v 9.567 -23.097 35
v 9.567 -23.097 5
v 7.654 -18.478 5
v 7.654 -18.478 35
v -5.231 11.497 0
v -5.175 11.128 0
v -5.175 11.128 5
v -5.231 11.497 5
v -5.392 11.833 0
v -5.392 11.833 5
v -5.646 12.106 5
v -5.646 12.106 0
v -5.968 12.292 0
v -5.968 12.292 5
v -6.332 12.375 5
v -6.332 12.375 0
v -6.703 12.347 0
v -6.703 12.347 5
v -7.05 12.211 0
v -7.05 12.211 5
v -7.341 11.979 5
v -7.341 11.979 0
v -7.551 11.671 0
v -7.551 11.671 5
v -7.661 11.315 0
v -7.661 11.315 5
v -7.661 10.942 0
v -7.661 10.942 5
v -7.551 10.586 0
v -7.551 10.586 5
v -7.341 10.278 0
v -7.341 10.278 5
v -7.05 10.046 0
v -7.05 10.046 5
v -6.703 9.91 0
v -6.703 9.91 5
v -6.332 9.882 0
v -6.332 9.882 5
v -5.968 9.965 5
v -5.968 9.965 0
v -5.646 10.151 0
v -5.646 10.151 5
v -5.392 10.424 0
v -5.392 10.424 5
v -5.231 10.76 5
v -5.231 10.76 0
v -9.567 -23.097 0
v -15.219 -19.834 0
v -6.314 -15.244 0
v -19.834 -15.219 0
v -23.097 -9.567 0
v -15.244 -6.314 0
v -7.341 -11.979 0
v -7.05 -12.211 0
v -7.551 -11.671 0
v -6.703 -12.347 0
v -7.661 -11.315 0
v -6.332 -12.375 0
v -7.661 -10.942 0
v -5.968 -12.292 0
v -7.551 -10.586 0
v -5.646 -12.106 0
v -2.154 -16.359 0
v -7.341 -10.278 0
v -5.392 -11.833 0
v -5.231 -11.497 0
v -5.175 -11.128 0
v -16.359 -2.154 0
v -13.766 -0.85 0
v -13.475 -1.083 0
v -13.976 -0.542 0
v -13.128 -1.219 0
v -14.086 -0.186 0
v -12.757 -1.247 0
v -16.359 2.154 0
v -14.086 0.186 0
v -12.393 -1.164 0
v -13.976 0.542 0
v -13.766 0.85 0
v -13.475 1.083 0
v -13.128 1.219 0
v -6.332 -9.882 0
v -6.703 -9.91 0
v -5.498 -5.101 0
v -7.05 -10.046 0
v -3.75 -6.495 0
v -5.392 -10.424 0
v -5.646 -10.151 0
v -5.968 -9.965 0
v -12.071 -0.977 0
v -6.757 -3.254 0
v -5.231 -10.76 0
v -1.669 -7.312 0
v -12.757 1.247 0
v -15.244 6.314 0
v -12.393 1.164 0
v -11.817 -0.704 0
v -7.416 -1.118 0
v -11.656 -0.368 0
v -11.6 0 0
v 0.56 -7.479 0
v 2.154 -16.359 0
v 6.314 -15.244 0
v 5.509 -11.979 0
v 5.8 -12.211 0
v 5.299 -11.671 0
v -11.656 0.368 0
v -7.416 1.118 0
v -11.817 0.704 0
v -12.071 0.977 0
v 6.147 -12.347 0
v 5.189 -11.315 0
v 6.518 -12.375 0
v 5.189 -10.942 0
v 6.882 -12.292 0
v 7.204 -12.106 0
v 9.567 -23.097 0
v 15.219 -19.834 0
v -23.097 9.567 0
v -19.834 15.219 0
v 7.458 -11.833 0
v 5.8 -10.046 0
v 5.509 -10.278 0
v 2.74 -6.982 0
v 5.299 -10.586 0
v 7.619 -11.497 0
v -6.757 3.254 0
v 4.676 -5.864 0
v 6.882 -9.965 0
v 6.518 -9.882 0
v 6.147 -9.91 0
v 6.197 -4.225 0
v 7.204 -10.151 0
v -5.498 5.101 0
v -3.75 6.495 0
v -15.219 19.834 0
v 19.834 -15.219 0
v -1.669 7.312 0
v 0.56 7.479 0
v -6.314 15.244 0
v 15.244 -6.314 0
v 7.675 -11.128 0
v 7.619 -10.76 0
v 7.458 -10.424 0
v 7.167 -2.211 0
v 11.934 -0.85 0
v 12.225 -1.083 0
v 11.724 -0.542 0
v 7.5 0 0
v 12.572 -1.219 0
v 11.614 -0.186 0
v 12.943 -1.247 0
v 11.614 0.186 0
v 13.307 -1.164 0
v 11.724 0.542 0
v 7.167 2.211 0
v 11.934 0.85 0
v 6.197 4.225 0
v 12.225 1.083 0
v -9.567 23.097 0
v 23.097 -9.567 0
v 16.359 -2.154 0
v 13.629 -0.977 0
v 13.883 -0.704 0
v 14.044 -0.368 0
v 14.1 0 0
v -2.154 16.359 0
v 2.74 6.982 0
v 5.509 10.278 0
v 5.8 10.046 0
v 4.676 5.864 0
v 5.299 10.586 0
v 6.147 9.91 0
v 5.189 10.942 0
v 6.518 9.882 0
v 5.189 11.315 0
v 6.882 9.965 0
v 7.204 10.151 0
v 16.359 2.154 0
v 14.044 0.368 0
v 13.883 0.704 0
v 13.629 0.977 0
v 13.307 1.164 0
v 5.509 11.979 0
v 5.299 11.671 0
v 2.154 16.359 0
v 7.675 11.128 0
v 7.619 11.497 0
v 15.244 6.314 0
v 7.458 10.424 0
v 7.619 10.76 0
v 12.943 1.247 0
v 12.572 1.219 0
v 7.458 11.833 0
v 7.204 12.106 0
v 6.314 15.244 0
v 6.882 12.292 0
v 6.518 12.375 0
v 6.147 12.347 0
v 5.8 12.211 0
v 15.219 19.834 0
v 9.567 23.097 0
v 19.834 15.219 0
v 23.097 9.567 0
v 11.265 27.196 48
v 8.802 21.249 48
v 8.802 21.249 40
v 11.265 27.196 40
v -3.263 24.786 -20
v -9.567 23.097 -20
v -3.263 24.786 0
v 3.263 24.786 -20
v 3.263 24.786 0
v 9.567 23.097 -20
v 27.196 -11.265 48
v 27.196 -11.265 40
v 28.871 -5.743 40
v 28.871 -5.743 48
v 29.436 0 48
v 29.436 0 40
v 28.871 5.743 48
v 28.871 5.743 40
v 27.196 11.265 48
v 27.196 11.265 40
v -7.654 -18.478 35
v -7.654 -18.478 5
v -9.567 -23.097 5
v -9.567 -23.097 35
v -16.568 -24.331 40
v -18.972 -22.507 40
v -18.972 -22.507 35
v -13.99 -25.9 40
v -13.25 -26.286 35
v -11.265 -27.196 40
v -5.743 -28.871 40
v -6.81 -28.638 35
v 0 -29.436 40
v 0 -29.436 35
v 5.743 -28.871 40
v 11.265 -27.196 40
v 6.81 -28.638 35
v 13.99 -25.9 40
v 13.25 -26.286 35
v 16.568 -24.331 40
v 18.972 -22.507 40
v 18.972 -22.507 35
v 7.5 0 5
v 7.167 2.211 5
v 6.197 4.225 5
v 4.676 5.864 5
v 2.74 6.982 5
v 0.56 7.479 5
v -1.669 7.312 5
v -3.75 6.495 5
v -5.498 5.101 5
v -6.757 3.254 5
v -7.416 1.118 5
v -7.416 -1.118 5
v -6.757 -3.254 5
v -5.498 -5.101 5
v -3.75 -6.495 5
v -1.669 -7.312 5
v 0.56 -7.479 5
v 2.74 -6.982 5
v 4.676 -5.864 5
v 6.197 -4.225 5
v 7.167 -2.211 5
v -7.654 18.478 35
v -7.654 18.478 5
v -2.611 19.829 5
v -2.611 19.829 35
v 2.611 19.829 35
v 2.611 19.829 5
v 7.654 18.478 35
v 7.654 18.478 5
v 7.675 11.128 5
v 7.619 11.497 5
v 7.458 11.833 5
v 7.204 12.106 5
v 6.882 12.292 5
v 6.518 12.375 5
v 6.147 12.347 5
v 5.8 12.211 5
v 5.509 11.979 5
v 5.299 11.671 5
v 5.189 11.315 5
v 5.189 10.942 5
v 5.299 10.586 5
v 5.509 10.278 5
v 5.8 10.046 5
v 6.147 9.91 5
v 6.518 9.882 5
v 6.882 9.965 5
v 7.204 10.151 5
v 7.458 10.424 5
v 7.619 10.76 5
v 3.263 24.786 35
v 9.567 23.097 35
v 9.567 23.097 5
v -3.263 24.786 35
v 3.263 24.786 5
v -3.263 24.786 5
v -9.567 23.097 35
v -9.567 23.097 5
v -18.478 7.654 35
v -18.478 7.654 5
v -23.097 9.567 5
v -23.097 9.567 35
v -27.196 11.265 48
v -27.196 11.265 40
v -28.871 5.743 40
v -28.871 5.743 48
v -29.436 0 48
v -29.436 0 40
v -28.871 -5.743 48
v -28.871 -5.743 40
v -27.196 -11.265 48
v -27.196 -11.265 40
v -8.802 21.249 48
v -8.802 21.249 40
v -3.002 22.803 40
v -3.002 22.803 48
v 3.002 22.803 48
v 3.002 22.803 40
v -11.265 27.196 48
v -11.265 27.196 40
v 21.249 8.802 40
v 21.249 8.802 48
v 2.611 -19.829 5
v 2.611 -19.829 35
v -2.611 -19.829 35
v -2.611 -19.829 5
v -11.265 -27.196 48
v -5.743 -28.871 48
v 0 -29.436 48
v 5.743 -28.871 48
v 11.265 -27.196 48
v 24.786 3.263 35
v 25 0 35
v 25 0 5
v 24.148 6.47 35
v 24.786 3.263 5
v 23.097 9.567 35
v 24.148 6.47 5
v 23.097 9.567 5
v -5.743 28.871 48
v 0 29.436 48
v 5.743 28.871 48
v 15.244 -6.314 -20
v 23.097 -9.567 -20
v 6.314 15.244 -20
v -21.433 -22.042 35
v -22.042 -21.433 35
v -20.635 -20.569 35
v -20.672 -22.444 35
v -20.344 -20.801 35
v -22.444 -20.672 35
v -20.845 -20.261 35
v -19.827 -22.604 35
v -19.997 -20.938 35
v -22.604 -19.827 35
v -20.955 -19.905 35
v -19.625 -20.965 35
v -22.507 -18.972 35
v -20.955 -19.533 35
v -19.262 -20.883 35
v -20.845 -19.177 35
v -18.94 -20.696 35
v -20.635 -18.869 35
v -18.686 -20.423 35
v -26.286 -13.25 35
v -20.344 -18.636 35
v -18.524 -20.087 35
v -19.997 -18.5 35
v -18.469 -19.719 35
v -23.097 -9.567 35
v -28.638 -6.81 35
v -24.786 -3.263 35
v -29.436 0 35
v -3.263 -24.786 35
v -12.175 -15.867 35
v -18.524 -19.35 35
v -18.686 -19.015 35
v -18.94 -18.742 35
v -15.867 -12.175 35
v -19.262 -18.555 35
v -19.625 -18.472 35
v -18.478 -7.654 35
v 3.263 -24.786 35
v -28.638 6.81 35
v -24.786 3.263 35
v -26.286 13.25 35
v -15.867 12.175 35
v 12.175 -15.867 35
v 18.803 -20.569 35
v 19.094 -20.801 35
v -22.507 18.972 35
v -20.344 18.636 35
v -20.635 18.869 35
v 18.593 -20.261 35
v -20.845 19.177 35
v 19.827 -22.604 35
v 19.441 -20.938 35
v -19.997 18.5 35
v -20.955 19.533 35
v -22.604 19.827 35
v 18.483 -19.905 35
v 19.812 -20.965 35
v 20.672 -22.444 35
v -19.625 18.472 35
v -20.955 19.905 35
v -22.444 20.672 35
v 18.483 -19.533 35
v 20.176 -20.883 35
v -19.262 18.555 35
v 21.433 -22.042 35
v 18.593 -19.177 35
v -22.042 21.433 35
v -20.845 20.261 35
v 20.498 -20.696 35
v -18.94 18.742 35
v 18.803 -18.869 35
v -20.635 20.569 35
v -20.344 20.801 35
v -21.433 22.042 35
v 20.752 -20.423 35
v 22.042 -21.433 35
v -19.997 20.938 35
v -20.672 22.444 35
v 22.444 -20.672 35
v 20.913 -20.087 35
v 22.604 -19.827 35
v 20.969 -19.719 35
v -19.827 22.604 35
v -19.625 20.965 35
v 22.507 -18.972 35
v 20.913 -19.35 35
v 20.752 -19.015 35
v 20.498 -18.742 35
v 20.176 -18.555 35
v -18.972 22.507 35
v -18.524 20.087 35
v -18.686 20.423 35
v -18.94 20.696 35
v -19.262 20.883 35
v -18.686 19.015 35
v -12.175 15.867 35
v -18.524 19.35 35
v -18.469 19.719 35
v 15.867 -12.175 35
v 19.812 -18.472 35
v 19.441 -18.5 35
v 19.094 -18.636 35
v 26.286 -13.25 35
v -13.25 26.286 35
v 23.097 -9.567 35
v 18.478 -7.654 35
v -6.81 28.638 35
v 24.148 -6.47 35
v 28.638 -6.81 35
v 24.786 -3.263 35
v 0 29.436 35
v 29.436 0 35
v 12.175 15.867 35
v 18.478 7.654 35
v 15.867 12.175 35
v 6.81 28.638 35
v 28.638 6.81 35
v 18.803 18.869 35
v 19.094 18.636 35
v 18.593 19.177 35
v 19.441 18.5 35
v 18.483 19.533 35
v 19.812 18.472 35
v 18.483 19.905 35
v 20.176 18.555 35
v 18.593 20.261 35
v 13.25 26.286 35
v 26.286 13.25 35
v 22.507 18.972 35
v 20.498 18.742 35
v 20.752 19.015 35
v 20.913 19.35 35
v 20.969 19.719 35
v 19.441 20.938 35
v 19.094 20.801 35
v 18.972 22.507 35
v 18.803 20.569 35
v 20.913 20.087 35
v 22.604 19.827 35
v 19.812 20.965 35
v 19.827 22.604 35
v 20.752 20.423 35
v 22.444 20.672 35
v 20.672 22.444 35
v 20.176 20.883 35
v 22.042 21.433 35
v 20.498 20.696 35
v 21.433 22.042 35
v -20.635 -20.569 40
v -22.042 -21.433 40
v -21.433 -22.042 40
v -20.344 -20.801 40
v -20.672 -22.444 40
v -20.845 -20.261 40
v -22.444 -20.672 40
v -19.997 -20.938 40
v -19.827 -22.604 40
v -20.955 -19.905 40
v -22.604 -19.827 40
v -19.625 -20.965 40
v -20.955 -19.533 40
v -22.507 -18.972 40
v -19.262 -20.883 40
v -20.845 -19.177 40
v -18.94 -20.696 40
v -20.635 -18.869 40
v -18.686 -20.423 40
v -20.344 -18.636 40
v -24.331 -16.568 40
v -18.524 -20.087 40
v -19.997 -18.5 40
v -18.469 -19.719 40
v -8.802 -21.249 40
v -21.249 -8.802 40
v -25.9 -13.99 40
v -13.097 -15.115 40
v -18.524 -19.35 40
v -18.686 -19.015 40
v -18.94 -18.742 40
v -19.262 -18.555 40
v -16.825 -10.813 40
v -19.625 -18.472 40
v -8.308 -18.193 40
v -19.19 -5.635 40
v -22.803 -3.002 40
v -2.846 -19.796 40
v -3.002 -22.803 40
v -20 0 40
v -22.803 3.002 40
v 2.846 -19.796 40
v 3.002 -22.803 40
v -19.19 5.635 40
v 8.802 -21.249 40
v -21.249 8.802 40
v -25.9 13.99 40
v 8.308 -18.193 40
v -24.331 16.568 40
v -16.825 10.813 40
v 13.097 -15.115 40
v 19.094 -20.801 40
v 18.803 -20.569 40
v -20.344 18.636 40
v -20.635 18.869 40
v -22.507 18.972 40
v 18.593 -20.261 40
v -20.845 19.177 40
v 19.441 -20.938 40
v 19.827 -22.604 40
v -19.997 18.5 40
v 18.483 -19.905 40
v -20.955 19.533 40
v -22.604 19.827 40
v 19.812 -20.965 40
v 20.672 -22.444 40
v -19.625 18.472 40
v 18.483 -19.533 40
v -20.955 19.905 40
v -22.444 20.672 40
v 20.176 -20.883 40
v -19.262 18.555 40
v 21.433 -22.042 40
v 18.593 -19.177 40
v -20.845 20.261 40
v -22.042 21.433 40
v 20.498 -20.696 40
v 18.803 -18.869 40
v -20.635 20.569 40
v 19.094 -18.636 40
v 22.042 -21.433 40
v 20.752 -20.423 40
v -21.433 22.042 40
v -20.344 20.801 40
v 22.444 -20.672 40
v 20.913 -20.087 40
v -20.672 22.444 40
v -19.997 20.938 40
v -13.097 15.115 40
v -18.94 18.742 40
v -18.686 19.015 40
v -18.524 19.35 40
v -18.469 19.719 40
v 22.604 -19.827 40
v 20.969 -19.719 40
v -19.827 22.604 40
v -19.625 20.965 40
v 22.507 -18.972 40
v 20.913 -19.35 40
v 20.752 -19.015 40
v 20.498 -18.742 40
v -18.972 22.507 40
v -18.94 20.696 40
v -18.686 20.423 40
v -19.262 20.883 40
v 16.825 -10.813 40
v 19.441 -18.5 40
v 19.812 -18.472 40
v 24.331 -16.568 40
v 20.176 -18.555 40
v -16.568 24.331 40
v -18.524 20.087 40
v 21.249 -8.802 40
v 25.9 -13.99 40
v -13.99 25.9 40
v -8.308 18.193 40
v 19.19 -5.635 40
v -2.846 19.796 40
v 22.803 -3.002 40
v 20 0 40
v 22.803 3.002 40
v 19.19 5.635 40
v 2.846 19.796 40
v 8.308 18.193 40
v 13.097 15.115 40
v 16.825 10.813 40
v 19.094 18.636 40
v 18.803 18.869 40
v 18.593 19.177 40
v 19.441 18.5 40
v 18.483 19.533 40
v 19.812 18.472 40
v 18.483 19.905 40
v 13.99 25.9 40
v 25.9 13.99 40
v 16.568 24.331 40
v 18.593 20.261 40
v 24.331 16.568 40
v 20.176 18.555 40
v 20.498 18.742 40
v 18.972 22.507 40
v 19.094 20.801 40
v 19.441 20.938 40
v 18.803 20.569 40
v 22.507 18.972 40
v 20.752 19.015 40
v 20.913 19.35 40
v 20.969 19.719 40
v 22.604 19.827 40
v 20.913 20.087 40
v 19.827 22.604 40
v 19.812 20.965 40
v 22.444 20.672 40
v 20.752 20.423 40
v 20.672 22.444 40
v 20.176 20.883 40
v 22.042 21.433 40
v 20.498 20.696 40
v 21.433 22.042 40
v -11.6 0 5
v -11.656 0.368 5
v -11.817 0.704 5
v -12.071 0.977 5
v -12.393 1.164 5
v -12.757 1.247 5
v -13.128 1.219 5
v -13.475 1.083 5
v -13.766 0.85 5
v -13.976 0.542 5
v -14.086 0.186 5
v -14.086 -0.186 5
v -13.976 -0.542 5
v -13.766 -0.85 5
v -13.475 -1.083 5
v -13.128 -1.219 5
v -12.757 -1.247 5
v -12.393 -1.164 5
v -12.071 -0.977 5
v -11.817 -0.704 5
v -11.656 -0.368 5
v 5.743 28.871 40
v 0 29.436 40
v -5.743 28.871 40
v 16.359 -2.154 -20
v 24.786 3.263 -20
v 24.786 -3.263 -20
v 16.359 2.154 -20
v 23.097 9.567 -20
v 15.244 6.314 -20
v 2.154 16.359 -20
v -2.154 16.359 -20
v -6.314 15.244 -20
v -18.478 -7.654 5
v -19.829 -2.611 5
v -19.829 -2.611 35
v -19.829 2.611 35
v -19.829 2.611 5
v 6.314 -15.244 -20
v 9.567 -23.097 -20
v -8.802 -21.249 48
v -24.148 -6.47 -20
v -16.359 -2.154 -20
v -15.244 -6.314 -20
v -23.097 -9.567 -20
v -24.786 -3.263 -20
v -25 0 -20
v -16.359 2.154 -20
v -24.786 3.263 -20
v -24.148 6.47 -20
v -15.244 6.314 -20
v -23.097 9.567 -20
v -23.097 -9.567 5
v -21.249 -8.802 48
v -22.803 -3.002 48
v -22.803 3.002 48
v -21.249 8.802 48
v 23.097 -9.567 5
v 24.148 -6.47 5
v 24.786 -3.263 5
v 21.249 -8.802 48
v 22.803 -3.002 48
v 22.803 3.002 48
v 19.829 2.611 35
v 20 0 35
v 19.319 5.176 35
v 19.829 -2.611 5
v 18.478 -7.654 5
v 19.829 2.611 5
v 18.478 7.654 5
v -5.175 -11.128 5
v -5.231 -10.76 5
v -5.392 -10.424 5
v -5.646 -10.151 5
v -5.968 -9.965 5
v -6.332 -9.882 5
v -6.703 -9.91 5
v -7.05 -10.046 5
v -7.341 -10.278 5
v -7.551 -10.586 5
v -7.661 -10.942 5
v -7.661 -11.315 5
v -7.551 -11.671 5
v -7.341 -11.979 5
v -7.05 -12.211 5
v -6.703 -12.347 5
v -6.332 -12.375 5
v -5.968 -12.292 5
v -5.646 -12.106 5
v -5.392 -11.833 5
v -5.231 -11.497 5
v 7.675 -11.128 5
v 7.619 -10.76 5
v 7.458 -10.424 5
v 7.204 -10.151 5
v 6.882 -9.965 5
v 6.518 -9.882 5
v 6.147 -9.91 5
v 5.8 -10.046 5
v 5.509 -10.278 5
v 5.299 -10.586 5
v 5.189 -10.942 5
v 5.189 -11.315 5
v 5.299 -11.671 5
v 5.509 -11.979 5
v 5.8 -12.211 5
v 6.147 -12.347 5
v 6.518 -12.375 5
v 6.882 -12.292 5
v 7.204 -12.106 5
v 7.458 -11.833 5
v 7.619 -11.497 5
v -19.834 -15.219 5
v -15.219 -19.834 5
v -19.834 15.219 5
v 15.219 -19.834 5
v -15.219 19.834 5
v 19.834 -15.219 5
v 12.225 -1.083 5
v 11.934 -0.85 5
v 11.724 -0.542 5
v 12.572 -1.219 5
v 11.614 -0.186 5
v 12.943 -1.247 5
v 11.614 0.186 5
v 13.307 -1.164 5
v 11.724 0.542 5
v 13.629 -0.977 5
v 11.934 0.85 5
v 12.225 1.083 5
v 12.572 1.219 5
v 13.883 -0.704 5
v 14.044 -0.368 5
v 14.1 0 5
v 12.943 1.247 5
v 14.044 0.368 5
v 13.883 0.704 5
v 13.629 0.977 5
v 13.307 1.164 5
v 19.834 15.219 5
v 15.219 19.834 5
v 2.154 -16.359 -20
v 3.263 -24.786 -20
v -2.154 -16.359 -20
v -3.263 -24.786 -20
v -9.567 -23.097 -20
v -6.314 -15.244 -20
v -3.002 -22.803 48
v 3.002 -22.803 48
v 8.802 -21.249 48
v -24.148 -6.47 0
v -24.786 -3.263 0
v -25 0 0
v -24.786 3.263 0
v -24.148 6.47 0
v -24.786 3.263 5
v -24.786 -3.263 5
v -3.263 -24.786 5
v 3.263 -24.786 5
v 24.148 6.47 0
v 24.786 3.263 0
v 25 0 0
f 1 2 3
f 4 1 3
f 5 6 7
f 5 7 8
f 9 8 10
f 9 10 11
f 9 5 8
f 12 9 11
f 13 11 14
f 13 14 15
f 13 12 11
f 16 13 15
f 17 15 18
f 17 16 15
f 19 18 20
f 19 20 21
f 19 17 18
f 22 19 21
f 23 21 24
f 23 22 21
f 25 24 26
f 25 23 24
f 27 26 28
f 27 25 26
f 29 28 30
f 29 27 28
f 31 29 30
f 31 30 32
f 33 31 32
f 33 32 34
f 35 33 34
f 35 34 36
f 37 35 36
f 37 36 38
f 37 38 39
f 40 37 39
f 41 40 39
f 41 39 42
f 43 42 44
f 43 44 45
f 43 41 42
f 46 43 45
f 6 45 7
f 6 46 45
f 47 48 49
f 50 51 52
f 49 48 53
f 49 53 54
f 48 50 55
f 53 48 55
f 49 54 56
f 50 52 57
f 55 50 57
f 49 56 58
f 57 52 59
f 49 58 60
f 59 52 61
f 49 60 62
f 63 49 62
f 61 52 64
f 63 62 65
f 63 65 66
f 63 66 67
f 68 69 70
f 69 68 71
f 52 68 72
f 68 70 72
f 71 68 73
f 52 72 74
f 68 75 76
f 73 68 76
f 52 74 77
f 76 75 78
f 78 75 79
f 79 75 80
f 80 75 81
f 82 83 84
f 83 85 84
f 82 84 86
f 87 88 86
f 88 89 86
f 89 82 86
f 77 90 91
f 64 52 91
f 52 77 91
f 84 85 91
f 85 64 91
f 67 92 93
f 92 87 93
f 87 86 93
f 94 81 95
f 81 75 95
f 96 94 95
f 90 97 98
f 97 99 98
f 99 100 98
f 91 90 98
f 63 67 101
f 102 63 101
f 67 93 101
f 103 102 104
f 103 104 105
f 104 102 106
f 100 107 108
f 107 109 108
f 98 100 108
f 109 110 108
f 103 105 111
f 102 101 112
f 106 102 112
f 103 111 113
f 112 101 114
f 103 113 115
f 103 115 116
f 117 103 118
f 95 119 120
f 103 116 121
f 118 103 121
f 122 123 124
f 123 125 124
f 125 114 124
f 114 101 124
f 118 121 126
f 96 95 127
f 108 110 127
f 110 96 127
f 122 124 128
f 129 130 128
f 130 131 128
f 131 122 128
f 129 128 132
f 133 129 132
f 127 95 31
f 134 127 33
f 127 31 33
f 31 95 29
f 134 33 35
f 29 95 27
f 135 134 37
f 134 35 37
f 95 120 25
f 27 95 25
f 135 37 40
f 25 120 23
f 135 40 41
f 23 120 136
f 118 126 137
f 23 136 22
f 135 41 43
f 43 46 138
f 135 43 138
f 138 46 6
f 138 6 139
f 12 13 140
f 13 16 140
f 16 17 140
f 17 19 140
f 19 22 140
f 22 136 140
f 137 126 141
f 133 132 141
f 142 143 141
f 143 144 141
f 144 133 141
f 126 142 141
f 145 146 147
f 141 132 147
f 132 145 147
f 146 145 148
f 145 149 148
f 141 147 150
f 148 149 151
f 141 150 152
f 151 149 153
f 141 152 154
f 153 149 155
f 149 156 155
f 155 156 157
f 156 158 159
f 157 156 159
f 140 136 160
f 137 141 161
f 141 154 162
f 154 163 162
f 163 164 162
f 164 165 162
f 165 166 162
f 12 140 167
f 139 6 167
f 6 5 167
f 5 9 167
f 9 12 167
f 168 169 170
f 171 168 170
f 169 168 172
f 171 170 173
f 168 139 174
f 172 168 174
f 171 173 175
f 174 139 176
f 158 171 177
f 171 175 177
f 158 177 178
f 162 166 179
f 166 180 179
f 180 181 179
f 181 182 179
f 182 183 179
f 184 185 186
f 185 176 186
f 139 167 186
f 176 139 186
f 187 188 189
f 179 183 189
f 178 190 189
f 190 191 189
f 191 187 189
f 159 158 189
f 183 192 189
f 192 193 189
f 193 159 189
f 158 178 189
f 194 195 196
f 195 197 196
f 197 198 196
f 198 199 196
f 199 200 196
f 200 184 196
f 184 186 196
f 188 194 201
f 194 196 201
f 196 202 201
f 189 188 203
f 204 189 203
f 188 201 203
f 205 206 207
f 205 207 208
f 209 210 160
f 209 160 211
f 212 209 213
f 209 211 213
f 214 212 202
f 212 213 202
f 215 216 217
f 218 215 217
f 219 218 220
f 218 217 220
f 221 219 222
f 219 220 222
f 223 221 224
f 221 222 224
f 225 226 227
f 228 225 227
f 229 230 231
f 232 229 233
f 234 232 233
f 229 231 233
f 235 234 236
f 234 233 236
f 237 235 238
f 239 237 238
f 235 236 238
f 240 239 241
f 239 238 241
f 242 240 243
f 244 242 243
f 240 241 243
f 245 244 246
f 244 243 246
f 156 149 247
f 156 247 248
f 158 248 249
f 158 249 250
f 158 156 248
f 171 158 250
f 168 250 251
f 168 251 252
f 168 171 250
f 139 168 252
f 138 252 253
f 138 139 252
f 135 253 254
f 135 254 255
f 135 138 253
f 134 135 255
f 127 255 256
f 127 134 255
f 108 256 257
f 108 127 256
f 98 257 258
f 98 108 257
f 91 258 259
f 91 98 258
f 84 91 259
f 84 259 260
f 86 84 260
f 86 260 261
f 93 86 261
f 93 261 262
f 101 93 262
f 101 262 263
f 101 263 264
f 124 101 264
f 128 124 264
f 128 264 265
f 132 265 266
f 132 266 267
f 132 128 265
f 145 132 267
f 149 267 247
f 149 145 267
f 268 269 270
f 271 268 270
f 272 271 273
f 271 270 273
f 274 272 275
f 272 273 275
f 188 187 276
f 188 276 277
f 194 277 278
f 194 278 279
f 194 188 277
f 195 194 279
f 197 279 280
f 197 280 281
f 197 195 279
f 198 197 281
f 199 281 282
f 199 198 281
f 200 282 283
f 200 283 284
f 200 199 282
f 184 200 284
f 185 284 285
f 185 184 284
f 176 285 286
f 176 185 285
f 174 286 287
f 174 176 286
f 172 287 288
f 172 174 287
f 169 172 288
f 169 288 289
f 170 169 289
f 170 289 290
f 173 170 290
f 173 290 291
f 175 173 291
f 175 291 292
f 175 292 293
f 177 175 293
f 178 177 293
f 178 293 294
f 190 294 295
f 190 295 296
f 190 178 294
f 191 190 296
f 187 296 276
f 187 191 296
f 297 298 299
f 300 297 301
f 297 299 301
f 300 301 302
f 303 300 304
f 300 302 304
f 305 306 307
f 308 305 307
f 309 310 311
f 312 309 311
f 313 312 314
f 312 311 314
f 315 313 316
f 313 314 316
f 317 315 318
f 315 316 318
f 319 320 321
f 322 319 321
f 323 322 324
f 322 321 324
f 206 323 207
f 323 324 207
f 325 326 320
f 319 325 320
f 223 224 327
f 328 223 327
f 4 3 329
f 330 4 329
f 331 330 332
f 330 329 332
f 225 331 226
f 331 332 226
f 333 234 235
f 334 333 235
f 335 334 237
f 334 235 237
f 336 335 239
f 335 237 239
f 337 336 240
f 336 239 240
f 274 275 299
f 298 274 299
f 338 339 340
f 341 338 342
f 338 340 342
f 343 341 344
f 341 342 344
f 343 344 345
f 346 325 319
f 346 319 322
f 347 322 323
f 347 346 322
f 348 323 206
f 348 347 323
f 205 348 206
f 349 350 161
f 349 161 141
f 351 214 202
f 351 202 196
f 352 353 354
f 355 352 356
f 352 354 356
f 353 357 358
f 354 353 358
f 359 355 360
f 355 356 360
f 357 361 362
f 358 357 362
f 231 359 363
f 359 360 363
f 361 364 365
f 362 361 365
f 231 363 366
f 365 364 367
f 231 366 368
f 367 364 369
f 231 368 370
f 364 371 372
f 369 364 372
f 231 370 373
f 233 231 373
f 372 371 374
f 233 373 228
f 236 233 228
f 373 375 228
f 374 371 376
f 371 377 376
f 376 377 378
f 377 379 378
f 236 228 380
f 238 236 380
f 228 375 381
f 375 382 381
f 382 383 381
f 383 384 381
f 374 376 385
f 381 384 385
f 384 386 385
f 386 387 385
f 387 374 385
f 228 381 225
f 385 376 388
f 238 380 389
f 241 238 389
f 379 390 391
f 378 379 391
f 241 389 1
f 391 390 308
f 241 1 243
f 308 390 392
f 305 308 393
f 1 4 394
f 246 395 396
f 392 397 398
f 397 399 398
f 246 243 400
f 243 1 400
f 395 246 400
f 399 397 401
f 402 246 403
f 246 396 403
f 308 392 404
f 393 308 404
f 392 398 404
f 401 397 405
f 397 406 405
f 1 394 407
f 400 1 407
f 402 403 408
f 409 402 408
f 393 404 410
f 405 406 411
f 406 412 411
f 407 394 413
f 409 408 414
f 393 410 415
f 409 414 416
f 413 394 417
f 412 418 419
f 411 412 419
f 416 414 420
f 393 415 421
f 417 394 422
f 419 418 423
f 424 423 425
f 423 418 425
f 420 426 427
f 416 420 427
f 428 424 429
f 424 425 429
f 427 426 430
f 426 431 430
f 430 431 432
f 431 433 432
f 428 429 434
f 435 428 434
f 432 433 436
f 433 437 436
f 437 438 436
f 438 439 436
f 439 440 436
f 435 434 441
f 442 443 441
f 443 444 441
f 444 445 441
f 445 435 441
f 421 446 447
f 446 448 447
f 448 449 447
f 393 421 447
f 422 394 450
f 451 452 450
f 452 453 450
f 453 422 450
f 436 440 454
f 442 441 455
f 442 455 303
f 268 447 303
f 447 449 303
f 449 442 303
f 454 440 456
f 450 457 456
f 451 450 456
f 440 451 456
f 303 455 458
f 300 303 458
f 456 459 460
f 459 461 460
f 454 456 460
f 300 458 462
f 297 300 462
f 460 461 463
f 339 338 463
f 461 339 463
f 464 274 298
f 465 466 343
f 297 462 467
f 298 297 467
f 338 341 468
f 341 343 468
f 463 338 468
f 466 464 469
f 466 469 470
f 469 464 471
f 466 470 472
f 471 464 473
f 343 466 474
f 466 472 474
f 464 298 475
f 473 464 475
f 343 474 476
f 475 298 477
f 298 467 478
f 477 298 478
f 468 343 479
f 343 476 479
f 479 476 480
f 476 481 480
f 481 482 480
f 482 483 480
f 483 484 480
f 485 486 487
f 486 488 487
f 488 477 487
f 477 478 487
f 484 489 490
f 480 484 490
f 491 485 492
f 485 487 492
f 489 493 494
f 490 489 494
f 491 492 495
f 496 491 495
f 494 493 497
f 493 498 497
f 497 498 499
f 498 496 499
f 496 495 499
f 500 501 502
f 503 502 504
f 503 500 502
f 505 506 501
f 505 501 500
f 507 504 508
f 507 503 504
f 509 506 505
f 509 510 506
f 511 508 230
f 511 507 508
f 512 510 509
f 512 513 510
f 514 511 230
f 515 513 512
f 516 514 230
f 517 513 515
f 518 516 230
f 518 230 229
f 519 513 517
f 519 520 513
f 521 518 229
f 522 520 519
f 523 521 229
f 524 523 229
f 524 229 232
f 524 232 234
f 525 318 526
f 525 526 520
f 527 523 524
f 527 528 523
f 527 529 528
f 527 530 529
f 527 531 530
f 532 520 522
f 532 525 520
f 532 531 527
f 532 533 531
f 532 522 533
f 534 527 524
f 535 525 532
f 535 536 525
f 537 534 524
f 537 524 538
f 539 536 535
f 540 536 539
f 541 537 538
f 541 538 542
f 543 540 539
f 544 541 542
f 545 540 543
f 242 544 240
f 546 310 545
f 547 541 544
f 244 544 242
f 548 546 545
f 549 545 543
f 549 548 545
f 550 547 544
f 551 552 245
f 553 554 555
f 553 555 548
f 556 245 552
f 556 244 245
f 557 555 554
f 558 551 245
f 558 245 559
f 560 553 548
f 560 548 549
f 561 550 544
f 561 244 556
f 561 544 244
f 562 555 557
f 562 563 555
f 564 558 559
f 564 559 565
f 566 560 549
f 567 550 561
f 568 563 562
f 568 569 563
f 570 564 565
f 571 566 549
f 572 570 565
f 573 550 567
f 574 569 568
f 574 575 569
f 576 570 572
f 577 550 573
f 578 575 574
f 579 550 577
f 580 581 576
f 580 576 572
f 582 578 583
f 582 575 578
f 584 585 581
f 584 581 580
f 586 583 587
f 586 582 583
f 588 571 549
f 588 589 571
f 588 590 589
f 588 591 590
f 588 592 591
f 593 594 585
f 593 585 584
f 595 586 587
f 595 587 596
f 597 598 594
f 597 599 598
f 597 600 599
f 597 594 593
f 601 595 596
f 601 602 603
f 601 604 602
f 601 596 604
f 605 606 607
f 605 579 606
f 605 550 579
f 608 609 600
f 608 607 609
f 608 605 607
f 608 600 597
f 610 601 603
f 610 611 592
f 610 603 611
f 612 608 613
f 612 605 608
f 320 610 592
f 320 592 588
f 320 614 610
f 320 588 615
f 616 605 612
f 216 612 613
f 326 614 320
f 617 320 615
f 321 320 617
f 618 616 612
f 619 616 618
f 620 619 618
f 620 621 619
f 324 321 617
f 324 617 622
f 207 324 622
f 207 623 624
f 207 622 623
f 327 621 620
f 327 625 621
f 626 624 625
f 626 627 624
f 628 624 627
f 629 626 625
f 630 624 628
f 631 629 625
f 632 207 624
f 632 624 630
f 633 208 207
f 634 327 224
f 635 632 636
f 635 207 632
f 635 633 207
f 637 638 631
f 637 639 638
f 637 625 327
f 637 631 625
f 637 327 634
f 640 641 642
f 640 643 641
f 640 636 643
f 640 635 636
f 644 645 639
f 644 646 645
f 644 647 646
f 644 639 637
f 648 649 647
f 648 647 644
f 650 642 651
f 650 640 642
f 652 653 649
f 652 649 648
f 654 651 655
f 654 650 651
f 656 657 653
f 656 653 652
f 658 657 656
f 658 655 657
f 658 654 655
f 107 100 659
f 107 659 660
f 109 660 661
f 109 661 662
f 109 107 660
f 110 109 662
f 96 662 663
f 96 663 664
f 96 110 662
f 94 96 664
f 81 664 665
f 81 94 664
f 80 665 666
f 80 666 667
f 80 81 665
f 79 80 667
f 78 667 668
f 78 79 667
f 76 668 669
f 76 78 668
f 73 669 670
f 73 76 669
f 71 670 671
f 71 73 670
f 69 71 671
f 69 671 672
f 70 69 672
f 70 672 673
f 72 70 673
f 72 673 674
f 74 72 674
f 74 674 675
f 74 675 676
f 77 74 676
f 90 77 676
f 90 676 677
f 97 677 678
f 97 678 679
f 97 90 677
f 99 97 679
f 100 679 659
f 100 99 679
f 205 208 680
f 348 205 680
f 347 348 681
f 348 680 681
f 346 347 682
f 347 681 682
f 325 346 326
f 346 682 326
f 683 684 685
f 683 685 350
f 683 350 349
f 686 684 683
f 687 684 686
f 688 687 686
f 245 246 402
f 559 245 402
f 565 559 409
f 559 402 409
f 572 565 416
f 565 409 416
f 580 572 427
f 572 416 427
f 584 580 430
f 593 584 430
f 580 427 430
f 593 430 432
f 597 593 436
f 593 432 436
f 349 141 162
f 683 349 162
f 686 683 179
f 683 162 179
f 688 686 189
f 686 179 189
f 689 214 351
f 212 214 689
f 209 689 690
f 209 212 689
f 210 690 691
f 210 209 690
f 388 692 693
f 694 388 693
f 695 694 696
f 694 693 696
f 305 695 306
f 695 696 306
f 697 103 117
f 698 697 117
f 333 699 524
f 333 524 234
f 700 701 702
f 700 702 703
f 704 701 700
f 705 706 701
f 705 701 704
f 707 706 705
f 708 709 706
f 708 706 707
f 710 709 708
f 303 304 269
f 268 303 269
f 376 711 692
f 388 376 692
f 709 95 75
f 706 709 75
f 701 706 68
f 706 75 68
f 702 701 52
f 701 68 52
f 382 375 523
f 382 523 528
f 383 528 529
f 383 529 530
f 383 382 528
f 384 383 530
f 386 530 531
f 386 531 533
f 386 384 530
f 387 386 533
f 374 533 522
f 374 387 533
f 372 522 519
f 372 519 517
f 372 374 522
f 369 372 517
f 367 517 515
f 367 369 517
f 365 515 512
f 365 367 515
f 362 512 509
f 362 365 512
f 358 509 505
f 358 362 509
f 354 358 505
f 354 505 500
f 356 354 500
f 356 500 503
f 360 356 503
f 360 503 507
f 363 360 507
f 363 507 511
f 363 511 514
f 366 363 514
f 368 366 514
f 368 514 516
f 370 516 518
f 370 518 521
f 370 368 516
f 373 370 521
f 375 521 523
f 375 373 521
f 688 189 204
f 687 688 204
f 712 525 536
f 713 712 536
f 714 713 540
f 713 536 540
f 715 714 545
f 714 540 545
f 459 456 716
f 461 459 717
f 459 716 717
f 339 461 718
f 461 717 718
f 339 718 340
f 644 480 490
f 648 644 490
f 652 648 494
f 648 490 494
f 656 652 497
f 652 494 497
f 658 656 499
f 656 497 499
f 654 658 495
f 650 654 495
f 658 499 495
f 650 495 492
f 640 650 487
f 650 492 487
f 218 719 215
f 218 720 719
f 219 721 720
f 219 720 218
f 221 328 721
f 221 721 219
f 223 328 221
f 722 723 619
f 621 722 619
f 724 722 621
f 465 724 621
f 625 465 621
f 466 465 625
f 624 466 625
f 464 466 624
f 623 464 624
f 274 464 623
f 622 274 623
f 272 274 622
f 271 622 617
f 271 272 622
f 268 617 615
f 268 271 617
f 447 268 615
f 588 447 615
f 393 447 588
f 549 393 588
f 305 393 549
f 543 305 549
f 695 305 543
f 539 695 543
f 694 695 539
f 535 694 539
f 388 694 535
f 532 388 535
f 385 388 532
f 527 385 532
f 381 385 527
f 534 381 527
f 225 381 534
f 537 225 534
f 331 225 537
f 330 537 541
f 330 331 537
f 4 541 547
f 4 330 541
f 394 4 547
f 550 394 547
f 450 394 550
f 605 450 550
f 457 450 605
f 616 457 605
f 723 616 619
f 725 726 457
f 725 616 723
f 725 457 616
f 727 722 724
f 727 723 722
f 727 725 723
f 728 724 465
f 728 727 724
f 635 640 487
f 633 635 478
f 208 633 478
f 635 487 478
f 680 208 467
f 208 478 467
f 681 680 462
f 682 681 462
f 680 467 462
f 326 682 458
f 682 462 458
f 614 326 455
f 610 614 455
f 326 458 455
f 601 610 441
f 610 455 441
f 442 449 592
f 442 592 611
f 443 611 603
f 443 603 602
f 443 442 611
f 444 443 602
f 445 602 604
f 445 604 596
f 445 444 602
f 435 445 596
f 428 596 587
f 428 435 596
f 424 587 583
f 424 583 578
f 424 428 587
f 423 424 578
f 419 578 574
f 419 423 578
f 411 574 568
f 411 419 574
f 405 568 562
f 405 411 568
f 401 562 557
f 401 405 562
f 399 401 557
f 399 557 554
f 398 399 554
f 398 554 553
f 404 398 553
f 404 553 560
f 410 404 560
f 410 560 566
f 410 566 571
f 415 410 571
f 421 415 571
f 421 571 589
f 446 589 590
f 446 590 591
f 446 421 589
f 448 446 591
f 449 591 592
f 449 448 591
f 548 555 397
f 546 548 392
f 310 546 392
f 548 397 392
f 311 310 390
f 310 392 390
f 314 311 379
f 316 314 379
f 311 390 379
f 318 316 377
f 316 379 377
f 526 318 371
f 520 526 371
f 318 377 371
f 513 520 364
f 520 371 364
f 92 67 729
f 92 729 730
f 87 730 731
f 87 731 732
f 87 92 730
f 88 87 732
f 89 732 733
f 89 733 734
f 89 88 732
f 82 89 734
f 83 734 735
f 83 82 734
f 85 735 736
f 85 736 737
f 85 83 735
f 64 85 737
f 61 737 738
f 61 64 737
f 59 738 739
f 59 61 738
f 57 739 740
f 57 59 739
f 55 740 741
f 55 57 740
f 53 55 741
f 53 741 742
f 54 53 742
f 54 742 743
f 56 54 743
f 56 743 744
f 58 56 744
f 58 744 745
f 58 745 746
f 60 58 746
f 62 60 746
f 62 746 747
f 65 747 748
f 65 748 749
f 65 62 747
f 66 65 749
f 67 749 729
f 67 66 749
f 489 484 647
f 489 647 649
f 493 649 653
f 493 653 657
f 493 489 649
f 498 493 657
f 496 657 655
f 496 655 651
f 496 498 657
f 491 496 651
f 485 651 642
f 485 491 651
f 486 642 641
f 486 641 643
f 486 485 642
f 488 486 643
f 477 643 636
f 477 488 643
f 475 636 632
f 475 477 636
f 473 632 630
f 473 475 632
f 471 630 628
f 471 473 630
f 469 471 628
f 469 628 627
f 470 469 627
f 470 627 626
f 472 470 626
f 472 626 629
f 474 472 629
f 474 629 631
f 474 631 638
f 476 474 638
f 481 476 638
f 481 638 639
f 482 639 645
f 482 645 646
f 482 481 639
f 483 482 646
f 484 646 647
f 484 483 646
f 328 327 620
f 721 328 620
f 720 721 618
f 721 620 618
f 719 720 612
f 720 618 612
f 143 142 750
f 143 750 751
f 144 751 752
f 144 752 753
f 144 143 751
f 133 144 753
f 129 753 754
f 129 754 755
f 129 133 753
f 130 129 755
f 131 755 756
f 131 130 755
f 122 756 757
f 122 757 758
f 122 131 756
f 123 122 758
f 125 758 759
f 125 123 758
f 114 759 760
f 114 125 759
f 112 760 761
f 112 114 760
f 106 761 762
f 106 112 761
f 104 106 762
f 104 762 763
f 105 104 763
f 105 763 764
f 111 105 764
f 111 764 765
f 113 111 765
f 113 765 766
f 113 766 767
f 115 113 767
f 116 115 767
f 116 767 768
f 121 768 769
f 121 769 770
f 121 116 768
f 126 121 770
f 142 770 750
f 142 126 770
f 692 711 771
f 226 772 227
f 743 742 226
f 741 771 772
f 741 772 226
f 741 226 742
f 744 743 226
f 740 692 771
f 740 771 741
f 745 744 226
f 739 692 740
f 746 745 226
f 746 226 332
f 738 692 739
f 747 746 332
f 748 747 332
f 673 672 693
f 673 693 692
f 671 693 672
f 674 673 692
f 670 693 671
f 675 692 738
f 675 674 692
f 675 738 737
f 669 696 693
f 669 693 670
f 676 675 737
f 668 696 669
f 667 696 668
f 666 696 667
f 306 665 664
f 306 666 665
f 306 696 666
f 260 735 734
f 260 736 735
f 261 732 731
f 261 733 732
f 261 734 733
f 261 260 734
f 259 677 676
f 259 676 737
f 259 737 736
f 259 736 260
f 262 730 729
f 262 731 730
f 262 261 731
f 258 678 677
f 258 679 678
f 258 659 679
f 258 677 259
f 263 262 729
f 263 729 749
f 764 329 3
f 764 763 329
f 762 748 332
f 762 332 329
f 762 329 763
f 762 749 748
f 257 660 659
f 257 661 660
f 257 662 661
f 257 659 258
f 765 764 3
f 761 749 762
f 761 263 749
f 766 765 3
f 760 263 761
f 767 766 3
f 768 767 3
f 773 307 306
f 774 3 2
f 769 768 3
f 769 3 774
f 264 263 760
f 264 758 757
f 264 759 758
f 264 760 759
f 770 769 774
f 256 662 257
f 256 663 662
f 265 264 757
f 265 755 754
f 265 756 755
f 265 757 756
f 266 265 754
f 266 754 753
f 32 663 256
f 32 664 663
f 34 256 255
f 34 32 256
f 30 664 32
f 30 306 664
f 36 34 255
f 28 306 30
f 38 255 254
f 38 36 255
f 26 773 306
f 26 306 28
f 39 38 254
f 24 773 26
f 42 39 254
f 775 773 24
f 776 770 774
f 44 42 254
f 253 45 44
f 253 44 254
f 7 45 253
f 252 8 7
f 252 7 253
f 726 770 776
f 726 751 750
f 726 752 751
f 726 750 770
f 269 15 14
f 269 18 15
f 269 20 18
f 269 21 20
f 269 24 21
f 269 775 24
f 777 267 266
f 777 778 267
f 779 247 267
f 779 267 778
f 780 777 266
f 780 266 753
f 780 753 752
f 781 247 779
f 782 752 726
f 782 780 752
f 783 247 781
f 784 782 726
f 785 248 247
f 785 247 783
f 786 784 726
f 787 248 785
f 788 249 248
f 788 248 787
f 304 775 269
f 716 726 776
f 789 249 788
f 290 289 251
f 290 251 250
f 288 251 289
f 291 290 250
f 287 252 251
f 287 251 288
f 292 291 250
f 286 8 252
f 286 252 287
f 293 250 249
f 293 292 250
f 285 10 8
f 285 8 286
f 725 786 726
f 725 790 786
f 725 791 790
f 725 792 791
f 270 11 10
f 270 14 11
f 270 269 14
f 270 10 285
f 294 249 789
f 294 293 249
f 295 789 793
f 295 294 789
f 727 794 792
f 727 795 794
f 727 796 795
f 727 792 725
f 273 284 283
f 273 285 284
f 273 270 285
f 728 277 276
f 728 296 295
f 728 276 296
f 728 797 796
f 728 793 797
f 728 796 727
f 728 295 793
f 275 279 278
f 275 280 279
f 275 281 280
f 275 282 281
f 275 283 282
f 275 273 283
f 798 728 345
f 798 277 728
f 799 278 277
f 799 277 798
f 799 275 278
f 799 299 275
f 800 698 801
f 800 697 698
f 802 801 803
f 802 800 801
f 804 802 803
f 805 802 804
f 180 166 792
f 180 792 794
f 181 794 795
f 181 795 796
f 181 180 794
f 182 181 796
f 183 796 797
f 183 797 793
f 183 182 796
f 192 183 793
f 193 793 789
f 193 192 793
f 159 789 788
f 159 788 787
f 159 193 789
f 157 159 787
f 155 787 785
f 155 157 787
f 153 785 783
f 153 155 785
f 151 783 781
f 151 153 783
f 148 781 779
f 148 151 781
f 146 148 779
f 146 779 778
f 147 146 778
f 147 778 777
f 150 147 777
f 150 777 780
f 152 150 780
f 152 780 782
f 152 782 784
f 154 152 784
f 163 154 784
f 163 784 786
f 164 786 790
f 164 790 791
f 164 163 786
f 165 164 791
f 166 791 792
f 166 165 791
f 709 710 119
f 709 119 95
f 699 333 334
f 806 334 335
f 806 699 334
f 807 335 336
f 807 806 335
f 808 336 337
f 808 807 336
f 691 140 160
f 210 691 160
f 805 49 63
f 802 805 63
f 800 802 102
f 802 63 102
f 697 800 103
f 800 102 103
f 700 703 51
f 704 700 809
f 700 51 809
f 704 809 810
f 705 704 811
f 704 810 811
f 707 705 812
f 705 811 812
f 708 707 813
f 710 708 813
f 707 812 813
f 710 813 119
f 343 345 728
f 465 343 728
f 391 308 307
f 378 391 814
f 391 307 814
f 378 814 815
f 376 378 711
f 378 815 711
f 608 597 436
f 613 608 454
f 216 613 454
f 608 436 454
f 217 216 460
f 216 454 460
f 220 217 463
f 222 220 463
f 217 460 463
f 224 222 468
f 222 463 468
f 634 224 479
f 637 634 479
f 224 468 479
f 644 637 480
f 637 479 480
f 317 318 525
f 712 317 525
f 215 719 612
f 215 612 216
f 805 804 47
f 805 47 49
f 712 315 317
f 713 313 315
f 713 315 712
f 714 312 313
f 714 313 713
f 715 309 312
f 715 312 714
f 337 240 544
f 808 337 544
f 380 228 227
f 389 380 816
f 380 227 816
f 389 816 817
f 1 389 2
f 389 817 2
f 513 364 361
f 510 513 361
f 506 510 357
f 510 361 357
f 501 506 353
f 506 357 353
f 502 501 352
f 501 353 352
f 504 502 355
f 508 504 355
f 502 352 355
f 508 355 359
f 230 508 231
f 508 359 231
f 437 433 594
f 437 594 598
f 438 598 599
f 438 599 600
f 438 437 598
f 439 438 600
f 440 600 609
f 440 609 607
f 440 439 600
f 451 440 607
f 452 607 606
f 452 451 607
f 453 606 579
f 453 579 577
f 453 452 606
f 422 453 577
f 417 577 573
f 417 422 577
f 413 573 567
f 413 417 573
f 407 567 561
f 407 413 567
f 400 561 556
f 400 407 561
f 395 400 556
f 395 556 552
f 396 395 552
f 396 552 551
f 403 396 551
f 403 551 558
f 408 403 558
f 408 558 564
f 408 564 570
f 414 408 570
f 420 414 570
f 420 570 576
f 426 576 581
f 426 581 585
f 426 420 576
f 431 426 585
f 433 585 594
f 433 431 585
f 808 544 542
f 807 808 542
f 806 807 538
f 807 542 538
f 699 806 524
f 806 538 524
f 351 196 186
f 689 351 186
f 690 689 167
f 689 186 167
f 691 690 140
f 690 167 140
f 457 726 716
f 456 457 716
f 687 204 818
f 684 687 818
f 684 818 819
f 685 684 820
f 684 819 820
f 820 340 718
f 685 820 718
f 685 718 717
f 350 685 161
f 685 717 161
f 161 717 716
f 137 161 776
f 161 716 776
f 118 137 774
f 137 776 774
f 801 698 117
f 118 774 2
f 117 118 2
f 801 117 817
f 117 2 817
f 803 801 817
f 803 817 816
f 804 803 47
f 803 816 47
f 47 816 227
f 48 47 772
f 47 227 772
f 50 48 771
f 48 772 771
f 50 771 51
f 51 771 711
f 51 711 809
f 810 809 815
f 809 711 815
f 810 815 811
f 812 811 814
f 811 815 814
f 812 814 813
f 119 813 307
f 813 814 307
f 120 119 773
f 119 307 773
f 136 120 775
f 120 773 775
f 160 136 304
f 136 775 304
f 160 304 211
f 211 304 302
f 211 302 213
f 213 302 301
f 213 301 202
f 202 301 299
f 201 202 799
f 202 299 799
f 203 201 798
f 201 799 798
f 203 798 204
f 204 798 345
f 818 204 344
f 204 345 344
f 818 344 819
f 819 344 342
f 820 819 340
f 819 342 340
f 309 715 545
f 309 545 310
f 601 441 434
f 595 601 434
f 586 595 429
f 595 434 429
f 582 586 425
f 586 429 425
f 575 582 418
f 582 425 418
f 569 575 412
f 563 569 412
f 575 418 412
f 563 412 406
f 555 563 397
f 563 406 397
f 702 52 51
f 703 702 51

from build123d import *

# Parameters (mm, degrees)
SKETCH1_R           = 25
SKETCH1_R_2         = 1.25
SKETCH1_R_3         = 7.5
BOSS_EXTRUDE1_DEPTH = 5
BOSS_EXTRUDE2_DEPTH = 20
BOSS_EXTRUDE3_DEPTH = 30
SKETCH4_R           = 1.25
SKETCH4_R_2         = 20
BOSS_EXTRUDE4_DEPTH = 5
BOSS_EXTRUDE5_DEPTH = 8


with BuildPart() as part:
    # Sketch1 → Boss-Extrude1 (new body)
    with BuildSketch(Plane.XY):
        Circle(SKETCH1_R)
        with Locations((-12.85, 0)):
            Circle(SKETCH1_R_2, mode=Mode.SUBTRACT)
        with Locations((-6.425, 11.128426439)):
            Circle(SKETCH1_R_2, mode=Mode.SUBTRACT)
        with Locations((6.425, 11.128426439)):
            Circle(SKETCH1_R_2, mode=Mode.SUBTRACT)
        with Locations((12.85, 0)):
            Circle(SKETCH1_R_2, mode=Mode.SUBTRACT)
        with Locations((6.425, -11.128426439)):
            Circle(SKETCH1_R_2, mode=Mode.SUBTRACT)
        with Locations((-6.425, -11.128426439)):
            Circle(SKETCH1_R_2, mode=Mode.SUBTRACT)
        Circle(SKETCH1_R_3, mode=Mode.SUBTRACT)
    extrude(amount=BOSS_EXTRUDE1_DEPTH)

    # Sketch2 → Boss-Extrude2 (add)
    with BuildSketch(Plane(origin=(0, 0, 0), x_dir=(-1, 0, 0), z_dir=(0, 0, -1))):
        with BuildLine():
            Line((-15.244012286, 6.314276634), (-23.096988313, 9.567085809))
            ThreePointArc((-23.096988313, 9.567085809), (-25, 0), (-23.096988313, -9.567085809))
            Line((-23.096988313, -9.567085809), (-15.244012286, -6.314276634))
            ThreePointArc((-15.244012286, -6.314276634), (-16.5, 0), (-15.244012286, 6.314276634))
        make_face()
        with BuildLine():
            Line((6.314276634, 15.244012286), (9.567085809, 23.096988313))
            ThreePointArc((9.567085809, 23.096988313), (0, 25), (-9.567085809, 23.096988313))
            Line((-9.567085809, 23.096988313), (-6.314276634, 15.244012286))
            ThreePointArc((-6.314276634, 15.244012286), (0, 16.5), (6.314276634, 15.244012286))
        make_face()
        with BuildLine():
            ThreePointArc((25, 0), (24.51963201, 4.87725805), (23.096988313, 9.567085809))
            Line((23.096988313, 9.567085809), (15.244012286, 6.314276634))
            ThreePointArc((15.244012286, 6.314276634), (16.5, 0), (15.244012286, -6.314276634))
            Line((15.244012286, -6.314276634), (23.096988313, -9.567085809))
            ThreePointArc((23.096988313, -9.567085809), (24.51963201, -4.87725805), (25, 0))
        make_face()
        with BuildLine():
            ThreePointArc((-9.567085809, -23.096988313), (0, -25), (9.567085809, -23.096988313))
            Line((9.567085809, -23.096988313), (6.314276634, -15.244012286))
            ThreePointArc((6.314276634, -15.244012286), (0, -16.5), (-6.314276634, -15.244012286))
            Line((-6.314276634, -15.244012286), (-9.567085809, -23.096988313))
        make_face()
    extrude(amount=BOSS_EXTRUDE2_DEPTH)

    # Sketch3 → Boss-Extrude3 (add)
    with BuildSketch(Plane.XY.offset(5)):
        with BuildLine():
            Line((7.653668647, 18.47759065), (9.567085809, 23.096988313))
            ThreePointArc((9.567085809, 23.096988313), (0, 25), (-9.567085809, 23.096988313))
            Line((-9.567085809, 23.096988313), (-7.653668647, 18.47759065))
            ThreePointArc((-7.653668647, 18.47759065), (0, 20), (7.653668647, 18.47759065))
        make_face()
        with BuildLine():
            ThreePointArc((25, 0), (24.51963201, 4.87725805), (23.096988313, 9.567085809))
            Line((23.096988313, 9.567085809), (18.47759065, 7.653668647))
            ThreePointArc((18.47759065, 7.653668647), (20, 0), (18.47759065, -7.653668647))
            Line((18.47759065, -7.653668647), (23.096988313, -9.567085809))
            ThreePointArc((23.096988313, -9.567085809), (24.51963201, -4.87725805), (25, 0))
        make_face()
        with BuildLine():
            Line((-7.653668647, -18.47759065), (-9.567085809, -23.096988313))
            ThreePointArc((-9.567085809, -23.096988313), (0, -25), (9.567085809, -23.096988313))
            Line((9.567085809, -23.096988313), (7.653668647, -18.47759065))
            ThreePointArc((7.653668647, -18.47759065), (0, -20), (-7.653668647, -18.47759065))
        make_face()
        with BuildLine():
            Line((-18.47759065, 7.653668647), (-23.096988313, 9.567085809))
            ThreePointArc((-23.096988313, 9.567085809), (-25, 0), (-23.096988313, -9.567085809))
            Line((-23.096988313, -9.567085809), (-18.47759065, -7.653668647))
            ThreePointArc((-18.47759065, -7.653668647), (-20, 0), (-18.47759065, 7.653668647))
        make_face()
    extrude(amount=BOSS_EXTRUDE3_DEPTH)

    # Sketch4 → Boss-Extrude4 (add)
    with BuildSketch(Plane.XY.offset(35)):
        with BuildLine():
            ThreePointArc((22.507298661, 18.971764755), (21.760152434, 21.760152434), (18.971764755, 22.507298661))
            ThreePointArc((18.971764755, 22.507298661), (0, 29.436479935), (-18.971764755, 22.507298661))
            ThreePointArc((-18.971764755, 22.507298661), (-21.760152434, 21.760152434), (-22.507298661, 18.971764755))
            ThreePointArc((-22.507298661, 18.971764755), (-29.436479935, 0), (-22.507298661, -18.971764755))
            ThreePointArc((-22.507298661, -18.971764755), (-21.760152434, -21.760152434), (-18.971764755, -22.507298661))
            ThreePointArc((-18.971764755, -22.507298661), (0, -29.436479935), (18.971764755, -22.507298661))
            ThreePointArc((18.971764755, -22.507298661), (21.760152434, -21.760152434), (22.507298661, -18.971764755))
            ThreePointArc((22.507298661, -18.971764755), (29.436479935, 0), (22.507298661, 18.971764755))
        make_face()
        with Locations((-19.718910982, -19.718910982)):
            Circle(SKETCH4_R, mode=Mode.SUBTRACT)
        with Locations((19.718910982, -19.718910982)):
            Circle(SKETCH4_R, mode=Mode.SUBTRACT)
        with Locations((-19.718910982, 19.718910982)):
            Circle(SKETCH4_R, mode=Mode.SUBTRACT)
        Circle(SKETCH4_R_2, mode=Mode.SUBTRACT)
        with Locations((19.718910982, 19.718910982)):
            Circle(SKETCH4_R, mode=Mode.SUBTRACT)
    extrude(amount=BOSS_EXTRUDE4_DEPTH)

    # Sketch5 → Boss-Extrude5 (add)
    with BuildSketch(Plane.XY.offset(40)):
        with BuildLine():
            ThreePointArc((11.264853178, 27.195761321), (0, 29.436479935), (-11.264853178, 27.195761321))
            Line((-11.264853178, 27.195761321), (-8.801718944, 21.249229248))
            ThreePointArc((-8.801718944, 21.249229248), (0, 23), (8.801718944, 21.249229248))
            Line((8.801718944, 21.249229248), (11.264853178, 27.195761321))
        make_face()
        with BuildLine():
            Line((21.249229248, -8.801718944), (27.195761321, -11.264853178))
            ThreePointArc((27.195761321, -11.264853178), (29.436479935, 0), (27.195761321, 11.264853178))
            Line((27.195761321, 11.264853178), (21.249229248, 8.801718944))
            ThreePointArc((21.249229248, 8.801718944), (23, 0), (21.249229248, -8.801718944))
        make_face()
        with BuildLine():
            Line((-8.801718944, -21.249229248), (-11.264853178, -27.195761321))
            ThreePointArc((-11.264853178, -27.195761321), (0, -29.436479935), (11.264853178, -27.195761321))
            Line((11.264853178, -27.195761321), (8.801718944, -21.249229248))
            ThreePointArc((8.801718944, -21.249229248), (0, -23), (-8.801718944, -21.249229248))
        make_face()
        with BuildLine():
            Line((-21.249229248, 8.801718944), (-27.195761321, 11.264853178))
            ThreePointArc((-27.195761321, 11.264853178), (-29.436479935, 0), (-27.195761321, -11.264853178))
            Line((-27.195761321, -11.264853178), (-21.249229248, -8.801718944))
            ThreePointArc((-21.249229248, -8.801718944), (-23, 0), (-21.249229248, 8.801718944))
        make_face()
    extrude(amount=BOSS_EXTRUDE5_DEPTH)


solid = part.part
